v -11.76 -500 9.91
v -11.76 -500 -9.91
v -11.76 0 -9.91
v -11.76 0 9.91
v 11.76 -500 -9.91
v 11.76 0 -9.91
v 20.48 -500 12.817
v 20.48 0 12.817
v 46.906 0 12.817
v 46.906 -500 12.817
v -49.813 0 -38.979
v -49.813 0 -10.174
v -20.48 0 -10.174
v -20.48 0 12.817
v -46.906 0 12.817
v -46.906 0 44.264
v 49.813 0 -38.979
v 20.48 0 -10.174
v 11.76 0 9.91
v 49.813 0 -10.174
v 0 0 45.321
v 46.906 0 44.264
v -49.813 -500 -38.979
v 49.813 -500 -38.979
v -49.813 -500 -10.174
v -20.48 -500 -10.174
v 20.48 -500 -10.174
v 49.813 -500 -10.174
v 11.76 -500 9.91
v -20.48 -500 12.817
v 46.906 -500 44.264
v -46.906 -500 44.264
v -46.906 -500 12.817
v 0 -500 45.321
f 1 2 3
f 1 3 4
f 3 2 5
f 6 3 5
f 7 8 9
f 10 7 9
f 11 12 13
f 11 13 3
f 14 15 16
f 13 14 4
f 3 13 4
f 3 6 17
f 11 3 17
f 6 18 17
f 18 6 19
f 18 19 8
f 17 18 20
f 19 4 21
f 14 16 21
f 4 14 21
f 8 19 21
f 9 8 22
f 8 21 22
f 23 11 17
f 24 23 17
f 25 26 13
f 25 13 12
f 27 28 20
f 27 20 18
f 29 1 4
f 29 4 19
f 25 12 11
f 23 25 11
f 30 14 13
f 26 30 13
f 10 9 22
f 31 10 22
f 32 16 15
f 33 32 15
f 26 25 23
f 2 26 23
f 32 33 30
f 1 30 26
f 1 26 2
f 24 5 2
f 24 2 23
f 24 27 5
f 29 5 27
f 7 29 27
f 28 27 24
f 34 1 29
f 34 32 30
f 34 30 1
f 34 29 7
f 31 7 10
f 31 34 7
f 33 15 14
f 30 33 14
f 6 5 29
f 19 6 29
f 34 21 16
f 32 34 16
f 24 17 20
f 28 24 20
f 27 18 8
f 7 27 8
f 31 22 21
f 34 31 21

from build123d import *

# Parameters (mm, degrees)
F1_DEPTH = 500
F2_W     = 23.519294
F2_H     = 19.81963
F3_DEPTH = 500


with BuildPart() as f1:
    # F0 (on Front) → F1 (new body)
    with BuildSketch(Plane.XZ):
        Polygon((-49.813338, -38.97861), (0, -38.97861), (49.813338, -38.97861), (49.813338, -10.174078), (20.480286, -10.174078), (20.480286, 12.816695), (46.90646, 12.816695), (46.90646, 44.263847), (0, 45.320891), (-46.90646, 44.263847), (-46.90646, 12.816695), (-20.480286, 12.816695), (-20.480286, -10.174078), (-49.813338, -10.174078), align=None)
    extrude(amount=F1_DEPTH)

    # F2 (on face) → F3 (cut)
    with BuildSketch(Plane.XZ.offset(500)):
        Rectangle(F2_W, F2_H)
    extrude(amount=-F3_DEPTH, mode=Mode.SUBTRACT)


solid = f1.part
